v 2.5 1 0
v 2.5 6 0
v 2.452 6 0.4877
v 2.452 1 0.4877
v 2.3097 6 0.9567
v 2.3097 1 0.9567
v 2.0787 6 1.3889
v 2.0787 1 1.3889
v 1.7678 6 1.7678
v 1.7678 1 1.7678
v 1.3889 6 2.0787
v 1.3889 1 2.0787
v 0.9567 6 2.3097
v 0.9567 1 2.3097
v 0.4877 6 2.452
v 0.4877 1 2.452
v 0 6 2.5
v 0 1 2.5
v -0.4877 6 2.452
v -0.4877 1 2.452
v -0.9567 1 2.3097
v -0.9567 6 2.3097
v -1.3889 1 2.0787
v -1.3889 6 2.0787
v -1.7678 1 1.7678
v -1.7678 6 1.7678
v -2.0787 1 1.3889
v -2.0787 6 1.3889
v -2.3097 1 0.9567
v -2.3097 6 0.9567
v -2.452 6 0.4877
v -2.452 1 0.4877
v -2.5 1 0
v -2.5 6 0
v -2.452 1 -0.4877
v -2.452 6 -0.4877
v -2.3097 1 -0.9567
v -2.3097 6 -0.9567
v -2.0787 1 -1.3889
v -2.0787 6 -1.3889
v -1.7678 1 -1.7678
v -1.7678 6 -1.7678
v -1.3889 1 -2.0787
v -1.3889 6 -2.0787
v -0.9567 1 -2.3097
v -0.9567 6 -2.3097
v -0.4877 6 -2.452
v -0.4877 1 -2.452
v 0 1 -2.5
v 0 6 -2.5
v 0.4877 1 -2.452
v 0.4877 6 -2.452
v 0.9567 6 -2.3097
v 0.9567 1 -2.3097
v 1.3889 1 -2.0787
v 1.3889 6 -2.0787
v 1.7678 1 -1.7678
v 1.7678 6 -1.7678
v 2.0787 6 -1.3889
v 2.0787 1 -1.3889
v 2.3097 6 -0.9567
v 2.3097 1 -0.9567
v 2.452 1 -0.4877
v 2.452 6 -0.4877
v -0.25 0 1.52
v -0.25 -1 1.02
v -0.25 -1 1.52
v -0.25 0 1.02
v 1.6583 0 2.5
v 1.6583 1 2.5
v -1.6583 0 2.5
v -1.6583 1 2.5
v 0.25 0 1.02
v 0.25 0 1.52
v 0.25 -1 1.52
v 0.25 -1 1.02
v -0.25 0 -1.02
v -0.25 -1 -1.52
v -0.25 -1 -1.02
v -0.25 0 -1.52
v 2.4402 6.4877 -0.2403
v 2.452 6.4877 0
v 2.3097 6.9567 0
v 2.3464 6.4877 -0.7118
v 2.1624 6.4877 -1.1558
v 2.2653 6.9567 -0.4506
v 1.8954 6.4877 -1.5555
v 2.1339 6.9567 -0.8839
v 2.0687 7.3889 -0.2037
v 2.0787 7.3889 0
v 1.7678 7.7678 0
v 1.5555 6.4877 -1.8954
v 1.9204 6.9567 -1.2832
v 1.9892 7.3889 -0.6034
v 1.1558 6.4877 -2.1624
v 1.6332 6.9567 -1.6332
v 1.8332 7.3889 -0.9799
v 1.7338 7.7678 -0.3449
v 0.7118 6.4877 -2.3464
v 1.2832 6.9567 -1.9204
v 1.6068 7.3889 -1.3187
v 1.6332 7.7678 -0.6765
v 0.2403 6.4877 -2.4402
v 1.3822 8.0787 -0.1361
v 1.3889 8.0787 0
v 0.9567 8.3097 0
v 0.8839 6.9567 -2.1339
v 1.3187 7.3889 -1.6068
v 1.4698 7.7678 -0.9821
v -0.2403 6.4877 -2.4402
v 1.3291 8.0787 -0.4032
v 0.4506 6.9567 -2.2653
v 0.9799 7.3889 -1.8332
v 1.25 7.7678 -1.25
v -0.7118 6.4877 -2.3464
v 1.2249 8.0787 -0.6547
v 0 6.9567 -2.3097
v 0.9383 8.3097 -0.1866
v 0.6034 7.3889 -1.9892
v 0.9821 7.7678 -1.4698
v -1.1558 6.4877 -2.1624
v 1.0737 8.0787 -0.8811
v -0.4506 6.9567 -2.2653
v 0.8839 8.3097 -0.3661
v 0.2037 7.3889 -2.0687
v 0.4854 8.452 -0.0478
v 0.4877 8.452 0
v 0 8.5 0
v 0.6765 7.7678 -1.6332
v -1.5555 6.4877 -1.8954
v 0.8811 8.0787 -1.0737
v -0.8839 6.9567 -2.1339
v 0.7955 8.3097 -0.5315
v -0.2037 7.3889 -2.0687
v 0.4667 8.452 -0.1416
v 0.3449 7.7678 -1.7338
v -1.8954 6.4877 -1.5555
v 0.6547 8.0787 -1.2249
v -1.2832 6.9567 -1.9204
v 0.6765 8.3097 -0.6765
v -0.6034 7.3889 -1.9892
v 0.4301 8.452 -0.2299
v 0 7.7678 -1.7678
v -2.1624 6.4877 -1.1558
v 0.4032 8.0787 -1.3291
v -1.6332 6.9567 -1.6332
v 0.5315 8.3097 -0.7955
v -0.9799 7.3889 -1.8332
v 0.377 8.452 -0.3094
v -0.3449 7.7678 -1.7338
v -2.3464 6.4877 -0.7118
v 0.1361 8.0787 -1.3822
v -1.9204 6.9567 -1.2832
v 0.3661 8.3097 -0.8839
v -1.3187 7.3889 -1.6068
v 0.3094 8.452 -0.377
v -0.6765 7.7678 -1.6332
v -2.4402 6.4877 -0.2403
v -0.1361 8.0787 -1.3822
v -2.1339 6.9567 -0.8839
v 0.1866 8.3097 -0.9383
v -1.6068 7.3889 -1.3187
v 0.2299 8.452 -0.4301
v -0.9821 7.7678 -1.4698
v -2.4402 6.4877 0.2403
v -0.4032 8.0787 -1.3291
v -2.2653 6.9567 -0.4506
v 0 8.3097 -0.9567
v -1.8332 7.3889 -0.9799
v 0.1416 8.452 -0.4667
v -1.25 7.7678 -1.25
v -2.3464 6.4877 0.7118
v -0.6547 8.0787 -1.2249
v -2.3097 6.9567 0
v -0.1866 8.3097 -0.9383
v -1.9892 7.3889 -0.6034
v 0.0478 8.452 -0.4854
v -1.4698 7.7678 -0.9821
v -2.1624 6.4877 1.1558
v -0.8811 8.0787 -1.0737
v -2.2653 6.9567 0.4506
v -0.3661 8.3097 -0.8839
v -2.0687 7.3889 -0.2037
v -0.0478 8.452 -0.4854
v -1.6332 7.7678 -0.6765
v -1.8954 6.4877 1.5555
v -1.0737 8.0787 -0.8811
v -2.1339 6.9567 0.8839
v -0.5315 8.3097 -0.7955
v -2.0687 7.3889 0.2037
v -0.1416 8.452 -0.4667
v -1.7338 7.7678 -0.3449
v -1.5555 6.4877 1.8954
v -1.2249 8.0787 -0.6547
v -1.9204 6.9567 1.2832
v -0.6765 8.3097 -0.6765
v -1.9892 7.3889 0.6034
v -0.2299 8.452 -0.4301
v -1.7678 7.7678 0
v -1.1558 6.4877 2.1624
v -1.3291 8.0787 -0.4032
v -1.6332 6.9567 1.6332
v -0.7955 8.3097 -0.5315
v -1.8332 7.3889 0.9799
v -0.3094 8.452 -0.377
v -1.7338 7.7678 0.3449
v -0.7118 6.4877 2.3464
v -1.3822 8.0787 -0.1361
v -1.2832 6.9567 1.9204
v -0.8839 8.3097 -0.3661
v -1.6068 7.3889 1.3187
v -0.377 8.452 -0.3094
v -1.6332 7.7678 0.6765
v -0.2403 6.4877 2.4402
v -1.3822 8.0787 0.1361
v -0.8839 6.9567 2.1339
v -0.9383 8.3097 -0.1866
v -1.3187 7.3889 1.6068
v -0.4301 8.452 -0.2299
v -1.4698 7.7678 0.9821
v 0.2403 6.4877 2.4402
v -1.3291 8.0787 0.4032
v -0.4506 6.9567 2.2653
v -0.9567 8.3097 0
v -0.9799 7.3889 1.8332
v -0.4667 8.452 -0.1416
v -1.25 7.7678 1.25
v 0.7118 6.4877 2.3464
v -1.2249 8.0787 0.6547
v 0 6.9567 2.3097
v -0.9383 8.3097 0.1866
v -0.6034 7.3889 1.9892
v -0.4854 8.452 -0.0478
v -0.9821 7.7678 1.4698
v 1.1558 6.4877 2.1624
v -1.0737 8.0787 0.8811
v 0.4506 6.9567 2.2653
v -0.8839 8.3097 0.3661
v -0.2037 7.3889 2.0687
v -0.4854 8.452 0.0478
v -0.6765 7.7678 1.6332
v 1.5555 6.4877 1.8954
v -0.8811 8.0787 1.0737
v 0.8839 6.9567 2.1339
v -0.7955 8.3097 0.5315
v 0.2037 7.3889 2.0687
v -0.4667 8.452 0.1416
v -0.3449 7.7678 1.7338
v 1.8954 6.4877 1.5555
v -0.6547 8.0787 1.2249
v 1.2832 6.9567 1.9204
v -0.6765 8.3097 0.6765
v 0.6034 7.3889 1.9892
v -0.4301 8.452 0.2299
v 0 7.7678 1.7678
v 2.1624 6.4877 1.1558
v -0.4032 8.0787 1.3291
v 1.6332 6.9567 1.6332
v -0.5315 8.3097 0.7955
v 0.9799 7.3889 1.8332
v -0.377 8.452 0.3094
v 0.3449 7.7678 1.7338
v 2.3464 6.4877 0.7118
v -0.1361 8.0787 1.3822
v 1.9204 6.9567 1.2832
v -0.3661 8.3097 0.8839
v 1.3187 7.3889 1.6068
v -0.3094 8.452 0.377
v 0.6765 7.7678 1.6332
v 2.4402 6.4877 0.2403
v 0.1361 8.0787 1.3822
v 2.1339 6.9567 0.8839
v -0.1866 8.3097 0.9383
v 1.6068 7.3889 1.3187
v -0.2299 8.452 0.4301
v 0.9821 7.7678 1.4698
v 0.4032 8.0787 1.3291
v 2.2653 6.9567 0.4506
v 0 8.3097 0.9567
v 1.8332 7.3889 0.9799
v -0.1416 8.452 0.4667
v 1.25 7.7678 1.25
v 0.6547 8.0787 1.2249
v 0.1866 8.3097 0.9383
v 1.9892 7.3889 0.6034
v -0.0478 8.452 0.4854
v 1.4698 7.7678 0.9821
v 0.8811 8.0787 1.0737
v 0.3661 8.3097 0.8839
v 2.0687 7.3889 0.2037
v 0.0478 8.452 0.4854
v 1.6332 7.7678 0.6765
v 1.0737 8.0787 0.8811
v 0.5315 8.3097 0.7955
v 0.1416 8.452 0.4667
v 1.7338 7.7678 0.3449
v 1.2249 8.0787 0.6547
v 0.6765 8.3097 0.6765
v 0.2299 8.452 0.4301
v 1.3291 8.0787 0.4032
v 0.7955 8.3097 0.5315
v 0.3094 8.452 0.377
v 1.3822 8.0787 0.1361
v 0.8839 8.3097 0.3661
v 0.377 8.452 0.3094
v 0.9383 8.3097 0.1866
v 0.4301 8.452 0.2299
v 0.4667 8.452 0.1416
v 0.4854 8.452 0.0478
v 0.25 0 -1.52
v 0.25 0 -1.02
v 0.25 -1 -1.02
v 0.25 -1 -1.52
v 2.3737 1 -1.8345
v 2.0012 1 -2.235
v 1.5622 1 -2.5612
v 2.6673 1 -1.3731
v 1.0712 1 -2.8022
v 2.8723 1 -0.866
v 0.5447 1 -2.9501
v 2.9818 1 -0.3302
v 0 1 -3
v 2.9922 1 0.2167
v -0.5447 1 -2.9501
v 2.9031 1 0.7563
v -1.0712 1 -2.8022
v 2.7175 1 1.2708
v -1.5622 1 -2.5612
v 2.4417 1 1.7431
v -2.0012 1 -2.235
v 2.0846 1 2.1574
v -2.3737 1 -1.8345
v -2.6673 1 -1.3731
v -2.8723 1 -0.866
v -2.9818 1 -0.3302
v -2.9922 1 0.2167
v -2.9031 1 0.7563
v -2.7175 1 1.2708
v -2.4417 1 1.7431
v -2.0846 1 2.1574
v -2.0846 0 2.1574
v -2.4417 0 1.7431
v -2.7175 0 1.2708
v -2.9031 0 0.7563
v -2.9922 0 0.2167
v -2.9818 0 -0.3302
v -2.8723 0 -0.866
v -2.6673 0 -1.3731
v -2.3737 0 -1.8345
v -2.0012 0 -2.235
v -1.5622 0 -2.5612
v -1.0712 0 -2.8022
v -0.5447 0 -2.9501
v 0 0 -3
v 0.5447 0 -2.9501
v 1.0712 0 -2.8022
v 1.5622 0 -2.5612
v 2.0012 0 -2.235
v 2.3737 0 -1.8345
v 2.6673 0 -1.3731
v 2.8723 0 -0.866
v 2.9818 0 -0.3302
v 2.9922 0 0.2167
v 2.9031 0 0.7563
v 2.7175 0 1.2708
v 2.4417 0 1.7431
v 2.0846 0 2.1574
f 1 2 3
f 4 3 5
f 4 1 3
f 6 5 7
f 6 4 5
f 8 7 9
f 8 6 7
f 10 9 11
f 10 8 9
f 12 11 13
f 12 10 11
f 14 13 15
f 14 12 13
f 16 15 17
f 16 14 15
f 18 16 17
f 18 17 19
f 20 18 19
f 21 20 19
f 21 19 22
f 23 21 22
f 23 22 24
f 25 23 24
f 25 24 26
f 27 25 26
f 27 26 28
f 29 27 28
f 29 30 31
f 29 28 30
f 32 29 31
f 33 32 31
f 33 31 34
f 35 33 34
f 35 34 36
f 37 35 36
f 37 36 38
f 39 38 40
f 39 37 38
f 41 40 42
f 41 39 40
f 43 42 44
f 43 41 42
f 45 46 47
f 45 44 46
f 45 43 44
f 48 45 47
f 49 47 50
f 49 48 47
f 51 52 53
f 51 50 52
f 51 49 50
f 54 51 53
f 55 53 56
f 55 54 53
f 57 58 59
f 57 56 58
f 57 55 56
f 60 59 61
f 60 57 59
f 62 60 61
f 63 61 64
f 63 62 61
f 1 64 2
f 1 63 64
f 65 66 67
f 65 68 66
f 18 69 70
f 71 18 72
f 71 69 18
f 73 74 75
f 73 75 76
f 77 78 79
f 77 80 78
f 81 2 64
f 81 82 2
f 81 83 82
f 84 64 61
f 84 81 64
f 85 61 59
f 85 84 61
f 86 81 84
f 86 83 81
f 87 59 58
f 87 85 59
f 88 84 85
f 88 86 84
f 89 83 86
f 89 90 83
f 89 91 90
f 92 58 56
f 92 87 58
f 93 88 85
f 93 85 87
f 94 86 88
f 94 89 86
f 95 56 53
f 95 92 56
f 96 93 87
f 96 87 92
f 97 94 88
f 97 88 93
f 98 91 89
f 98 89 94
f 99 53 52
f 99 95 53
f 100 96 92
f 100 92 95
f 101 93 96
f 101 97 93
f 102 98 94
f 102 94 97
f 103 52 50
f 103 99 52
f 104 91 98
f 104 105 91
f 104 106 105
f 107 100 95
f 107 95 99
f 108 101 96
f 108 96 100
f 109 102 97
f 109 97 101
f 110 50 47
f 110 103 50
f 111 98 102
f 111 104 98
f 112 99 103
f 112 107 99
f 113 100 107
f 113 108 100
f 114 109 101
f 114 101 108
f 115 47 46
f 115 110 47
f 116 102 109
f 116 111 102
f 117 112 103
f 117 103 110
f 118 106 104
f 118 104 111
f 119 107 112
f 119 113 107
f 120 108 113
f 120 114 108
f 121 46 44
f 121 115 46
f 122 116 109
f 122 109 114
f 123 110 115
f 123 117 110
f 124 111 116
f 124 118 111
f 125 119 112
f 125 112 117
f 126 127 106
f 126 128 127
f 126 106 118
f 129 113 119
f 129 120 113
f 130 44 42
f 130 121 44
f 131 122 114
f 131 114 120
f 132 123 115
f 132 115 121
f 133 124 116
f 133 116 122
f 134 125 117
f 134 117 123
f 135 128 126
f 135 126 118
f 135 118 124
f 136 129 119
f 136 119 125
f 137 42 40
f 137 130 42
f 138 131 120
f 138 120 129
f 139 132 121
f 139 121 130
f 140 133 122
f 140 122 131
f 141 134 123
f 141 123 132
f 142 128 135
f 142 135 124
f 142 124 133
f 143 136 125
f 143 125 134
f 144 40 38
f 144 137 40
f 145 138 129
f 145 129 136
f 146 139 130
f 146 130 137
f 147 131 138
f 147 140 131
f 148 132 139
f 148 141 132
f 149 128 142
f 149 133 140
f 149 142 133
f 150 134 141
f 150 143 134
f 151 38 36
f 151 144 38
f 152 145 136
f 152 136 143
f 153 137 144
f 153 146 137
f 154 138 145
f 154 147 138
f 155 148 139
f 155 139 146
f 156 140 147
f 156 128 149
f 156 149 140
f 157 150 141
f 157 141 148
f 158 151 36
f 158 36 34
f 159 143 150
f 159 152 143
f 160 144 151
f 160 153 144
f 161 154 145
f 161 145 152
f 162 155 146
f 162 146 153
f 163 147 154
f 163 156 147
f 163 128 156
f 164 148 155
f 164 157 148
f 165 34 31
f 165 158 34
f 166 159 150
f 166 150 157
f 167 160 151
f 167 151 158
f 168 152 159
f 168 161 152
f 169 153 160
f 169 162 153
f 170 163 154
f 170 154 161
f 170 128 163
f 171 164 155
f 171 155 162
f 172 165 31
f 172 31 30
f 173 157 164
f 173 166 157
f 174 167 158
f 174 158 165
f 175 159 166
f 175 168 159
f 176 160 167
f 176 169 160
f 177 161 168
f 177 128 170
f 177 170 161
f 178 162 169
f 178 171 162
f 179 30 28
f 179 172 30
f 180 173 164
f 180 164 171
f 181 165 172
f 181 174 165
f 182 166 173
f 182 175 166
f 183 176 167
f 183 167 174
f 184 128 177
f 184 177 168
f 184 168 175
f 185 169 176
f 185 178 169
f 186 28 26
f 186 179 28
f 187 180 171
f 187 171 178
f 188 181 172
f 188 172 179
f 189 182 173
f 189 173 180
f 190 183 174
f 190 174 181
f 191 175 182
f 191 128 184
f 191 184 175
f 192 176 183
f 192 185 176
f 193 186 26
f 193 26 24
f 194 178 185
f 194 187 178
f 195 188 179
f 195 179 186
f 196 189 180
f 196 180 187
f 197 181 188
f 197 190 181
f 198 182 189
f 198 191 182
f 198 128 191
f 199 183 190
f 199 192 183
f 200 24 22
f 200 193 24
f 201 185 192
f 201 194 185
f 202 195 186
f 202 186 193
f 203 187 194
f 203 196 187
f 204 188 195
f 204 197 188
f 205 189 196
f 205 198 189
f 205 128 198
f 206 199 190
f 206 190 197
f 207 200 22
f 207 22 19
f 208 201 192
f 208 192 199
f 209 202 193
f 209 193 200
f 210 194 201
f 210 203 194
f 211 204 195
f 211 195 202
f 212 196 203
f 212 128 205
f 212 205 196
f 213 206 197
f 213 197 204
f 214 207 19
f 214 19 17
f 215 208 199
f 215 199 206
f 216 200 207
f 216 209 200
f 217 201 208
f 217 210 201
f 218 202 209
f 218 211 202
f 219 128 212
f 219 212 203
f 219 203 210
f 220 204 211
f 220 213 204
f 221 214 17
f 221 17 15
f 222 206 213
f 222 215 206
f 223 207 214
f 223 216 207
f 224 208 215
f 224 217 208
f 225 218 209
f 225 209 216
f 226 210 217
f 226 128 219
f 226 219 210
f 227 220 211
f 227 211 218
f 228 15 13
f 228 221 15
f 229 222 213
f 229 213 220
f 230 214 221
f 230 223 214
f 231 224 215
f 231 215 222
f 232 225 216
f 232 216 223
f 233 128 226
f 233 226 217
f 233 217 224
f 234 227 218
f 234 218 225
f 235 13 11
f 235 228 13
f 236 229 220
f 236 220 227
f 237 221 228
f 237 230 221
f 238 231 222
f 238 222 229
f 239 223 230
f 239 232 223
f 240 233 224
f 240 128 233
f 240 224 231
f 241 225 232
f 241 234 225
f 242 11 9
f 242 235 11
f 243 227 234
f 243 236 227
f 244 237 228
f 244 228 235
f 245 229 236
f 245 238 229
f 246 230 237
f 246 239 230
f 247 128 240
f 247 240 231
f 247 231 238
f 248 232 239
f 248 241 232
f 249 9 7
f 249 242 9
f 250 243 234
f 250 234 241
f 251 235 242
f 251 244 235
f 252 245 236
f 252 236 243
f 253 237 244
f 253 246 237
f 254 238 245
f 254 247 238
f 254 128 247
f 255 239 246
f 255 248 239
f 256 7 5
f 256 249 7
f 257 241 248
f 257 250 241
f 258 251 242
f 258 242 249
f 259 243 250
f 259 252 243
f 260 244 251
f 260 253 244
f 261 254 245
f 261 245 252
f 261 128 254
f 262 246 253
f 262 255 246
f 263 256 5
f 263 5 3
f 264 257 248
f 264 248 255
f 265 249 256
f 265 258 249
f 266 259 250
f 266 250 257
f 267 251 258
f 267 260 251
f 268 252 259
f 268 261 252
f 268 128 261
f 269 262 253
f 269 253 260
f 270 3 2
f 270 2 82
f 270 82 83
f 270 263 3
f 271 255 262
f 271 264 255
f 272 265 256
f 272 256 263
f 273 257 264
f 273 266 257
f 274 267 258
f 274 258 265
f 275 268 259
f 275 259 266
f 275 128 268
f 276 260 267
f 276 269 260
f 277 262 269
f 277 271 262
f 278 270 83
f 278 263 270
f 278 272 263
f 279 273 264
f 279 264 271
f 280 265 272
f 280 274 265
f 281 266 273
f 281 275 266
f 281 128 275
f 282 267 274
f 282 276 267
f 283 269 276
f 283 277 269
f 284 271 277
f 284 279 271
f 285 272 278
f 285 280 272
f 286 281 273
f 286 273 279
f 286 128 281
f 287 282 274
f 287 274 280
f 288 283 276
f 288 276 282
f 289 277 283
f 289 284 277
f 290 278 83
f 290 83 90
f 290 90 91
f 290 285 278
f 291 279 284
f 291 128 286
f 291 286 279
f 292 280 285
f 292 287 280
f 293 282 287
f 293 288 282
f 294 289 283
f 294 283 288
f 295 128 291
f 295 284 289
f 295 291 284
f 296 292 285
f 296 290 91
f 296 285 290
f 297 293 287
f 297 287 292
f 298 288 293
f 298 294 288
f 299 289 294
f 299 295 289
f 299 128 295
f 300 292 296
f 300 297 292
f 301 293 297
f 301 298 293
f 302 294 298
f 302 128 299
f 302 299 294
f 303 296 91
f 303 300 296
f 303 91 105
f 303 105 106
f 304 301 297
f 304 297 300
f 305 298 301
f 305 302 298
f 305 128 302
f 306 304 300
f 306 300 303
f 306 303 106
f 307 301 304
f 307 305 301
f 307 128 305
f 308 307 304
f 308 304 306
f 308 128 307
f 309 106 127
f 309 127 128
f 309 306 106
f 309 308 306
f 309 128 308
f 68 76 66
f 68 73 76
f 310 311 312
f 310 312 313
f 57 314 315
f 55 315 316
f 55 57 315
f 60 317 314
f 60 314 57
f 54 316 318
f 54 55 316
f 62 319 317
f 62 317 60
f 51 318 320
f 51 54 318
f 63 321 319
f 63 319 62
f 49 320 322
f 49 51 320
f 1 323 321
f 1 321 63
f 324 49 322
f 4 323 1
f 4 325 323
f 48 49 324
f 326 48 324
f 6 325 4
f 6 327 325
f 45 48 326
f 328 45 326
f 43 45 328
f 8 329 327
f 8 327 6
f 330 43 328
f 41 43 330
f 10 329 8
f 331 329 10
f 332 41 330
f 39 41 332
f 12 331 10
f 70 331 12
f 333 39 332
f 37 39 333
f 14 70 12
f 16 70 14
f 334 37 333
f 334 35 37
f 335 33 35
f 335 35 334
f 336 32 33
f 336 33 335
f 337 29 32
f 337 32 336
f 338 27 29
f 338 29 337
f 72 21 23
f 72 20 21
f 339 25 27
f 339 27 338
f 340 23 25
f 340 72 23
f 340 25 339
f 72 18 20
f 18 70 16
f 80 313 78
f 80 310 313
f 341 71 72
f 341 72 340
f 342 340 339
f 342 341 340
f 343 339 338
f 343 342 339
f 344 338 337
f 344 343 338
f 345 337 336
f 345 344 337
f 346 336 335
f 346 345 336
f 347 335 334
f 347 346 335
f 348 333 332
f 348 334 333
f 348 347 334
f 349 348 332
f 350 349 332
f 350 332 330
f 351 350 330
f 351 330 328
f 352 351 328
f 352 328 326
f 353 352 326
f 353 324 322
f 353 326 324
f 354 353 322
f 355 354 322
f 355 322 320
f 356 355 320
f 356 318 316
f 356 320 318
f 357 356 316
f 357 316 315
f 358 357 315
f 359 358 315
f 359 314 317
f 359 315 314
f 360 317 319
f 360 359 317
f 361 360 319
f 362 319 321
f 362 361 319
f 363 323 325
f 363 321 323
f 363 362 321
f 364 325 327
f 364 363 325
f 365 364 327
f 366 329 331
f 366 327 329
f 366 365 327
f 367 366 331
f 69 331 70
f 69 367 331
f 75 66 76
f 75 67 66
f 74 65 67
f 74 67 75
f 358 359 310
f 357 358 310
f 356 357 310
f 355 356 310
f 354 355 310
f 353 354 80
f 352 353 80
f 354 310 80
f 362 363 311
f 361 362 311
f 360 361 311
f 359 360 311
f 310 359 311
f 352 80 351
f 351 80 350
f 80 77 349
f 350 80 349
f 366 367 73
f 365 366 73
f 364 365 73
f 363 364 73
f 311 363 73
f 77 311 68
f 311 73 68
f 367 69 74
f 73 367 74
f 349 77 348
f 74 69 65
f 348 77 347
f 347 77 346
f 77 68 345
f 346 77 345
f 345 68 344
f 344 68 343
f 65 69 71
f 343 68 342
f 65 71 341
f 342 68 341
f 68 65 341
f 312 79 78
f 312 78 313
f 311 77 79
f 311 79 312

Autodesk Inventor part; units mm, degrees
ref_plane "YZ Plane" through (0, 0, 0) normal (1, 0, 0) x (0, 1, 0)
ref_plane "XZ Plane" through (0, 0, 0) normal (0, 1, 0) x (-1, 0, 0)
ref_plane "XY Plane" through (0, 0, 0) normal (0, 0, 1) x (1, 0, 0)
sketch "Sketch1" plane through (0, 0, 0) normal (0, 1, 0) x (-1, 0, 0)
  arc A0 (-1.6583, 2.5) -> (1.6583, 2.5) centre (0, 0) ccw
  circle A1 centre (0, 0) radius 2.5
  line L0 (-1.6583, 2.5) -> (1.6583, 2.5)
  dimension "d0" = 6
  dimension "d1" = 5
extrude "Extrusion3" add sketch "Sketch1" along normal blind 1 contours A1 | L0 A0
sketch "Sketch2" plane through (0, 1, 0) normal (0, 1, 0) x (1, 0, 0)
  circle A0 centre (0, 0) radius 2.5 projected
  point P0 (0, -2.5)
extrude "Extrusion5" add sketch "Sketch2" along normal blind 7.5
fillet "Fillet2" radius 2.5 1 edges at (-2.5, 8.5, 0)
sketch "Sketch3" plane through (0, 0, 0) normal (0, -1, 0) x (1, 0, 0)
  line L0 (-0.25, 1.52) -> (0.25, 1.52)
  line L1 (0.25, 1.52) -> (0.25, 1.02)
  line L2 (0.25, 1.02) -> (-0.25, 1.02)
  line L3 (-0.25, 1.02) -> (-0.25, 1.52)
  line L4 (-0.25, -1.02) -> (0.25, -1.02)
  line L5 (0.25, -1.02) -> (0.25, -1.52)
  line L6 (0.25, -1.52) -> (-0.25, -1.52)
  line L7 (-0.25, -1.52) -> (-0.25, -1.02)
  line L8 (-0.3964, 1.27) -> (0.6648, 1.27) construction
  line L9 (-0.5129, -1.27) -> (0.7016, -1.27) construction
  line L10 (-1.0602, 0) -> (0.7998, 0) construction
  point P0 (0, 0)
  point P1 (0.25, -1.27)
  point P2 (0.25, 1.27)
  point P3 (0, 1.02)
  dimension "d18" = 0.5
  dimension "d19" = 2.54
extrude "Extrusion6" add sketch "Sketch3" along normal blind 1
properties part number "LED"
